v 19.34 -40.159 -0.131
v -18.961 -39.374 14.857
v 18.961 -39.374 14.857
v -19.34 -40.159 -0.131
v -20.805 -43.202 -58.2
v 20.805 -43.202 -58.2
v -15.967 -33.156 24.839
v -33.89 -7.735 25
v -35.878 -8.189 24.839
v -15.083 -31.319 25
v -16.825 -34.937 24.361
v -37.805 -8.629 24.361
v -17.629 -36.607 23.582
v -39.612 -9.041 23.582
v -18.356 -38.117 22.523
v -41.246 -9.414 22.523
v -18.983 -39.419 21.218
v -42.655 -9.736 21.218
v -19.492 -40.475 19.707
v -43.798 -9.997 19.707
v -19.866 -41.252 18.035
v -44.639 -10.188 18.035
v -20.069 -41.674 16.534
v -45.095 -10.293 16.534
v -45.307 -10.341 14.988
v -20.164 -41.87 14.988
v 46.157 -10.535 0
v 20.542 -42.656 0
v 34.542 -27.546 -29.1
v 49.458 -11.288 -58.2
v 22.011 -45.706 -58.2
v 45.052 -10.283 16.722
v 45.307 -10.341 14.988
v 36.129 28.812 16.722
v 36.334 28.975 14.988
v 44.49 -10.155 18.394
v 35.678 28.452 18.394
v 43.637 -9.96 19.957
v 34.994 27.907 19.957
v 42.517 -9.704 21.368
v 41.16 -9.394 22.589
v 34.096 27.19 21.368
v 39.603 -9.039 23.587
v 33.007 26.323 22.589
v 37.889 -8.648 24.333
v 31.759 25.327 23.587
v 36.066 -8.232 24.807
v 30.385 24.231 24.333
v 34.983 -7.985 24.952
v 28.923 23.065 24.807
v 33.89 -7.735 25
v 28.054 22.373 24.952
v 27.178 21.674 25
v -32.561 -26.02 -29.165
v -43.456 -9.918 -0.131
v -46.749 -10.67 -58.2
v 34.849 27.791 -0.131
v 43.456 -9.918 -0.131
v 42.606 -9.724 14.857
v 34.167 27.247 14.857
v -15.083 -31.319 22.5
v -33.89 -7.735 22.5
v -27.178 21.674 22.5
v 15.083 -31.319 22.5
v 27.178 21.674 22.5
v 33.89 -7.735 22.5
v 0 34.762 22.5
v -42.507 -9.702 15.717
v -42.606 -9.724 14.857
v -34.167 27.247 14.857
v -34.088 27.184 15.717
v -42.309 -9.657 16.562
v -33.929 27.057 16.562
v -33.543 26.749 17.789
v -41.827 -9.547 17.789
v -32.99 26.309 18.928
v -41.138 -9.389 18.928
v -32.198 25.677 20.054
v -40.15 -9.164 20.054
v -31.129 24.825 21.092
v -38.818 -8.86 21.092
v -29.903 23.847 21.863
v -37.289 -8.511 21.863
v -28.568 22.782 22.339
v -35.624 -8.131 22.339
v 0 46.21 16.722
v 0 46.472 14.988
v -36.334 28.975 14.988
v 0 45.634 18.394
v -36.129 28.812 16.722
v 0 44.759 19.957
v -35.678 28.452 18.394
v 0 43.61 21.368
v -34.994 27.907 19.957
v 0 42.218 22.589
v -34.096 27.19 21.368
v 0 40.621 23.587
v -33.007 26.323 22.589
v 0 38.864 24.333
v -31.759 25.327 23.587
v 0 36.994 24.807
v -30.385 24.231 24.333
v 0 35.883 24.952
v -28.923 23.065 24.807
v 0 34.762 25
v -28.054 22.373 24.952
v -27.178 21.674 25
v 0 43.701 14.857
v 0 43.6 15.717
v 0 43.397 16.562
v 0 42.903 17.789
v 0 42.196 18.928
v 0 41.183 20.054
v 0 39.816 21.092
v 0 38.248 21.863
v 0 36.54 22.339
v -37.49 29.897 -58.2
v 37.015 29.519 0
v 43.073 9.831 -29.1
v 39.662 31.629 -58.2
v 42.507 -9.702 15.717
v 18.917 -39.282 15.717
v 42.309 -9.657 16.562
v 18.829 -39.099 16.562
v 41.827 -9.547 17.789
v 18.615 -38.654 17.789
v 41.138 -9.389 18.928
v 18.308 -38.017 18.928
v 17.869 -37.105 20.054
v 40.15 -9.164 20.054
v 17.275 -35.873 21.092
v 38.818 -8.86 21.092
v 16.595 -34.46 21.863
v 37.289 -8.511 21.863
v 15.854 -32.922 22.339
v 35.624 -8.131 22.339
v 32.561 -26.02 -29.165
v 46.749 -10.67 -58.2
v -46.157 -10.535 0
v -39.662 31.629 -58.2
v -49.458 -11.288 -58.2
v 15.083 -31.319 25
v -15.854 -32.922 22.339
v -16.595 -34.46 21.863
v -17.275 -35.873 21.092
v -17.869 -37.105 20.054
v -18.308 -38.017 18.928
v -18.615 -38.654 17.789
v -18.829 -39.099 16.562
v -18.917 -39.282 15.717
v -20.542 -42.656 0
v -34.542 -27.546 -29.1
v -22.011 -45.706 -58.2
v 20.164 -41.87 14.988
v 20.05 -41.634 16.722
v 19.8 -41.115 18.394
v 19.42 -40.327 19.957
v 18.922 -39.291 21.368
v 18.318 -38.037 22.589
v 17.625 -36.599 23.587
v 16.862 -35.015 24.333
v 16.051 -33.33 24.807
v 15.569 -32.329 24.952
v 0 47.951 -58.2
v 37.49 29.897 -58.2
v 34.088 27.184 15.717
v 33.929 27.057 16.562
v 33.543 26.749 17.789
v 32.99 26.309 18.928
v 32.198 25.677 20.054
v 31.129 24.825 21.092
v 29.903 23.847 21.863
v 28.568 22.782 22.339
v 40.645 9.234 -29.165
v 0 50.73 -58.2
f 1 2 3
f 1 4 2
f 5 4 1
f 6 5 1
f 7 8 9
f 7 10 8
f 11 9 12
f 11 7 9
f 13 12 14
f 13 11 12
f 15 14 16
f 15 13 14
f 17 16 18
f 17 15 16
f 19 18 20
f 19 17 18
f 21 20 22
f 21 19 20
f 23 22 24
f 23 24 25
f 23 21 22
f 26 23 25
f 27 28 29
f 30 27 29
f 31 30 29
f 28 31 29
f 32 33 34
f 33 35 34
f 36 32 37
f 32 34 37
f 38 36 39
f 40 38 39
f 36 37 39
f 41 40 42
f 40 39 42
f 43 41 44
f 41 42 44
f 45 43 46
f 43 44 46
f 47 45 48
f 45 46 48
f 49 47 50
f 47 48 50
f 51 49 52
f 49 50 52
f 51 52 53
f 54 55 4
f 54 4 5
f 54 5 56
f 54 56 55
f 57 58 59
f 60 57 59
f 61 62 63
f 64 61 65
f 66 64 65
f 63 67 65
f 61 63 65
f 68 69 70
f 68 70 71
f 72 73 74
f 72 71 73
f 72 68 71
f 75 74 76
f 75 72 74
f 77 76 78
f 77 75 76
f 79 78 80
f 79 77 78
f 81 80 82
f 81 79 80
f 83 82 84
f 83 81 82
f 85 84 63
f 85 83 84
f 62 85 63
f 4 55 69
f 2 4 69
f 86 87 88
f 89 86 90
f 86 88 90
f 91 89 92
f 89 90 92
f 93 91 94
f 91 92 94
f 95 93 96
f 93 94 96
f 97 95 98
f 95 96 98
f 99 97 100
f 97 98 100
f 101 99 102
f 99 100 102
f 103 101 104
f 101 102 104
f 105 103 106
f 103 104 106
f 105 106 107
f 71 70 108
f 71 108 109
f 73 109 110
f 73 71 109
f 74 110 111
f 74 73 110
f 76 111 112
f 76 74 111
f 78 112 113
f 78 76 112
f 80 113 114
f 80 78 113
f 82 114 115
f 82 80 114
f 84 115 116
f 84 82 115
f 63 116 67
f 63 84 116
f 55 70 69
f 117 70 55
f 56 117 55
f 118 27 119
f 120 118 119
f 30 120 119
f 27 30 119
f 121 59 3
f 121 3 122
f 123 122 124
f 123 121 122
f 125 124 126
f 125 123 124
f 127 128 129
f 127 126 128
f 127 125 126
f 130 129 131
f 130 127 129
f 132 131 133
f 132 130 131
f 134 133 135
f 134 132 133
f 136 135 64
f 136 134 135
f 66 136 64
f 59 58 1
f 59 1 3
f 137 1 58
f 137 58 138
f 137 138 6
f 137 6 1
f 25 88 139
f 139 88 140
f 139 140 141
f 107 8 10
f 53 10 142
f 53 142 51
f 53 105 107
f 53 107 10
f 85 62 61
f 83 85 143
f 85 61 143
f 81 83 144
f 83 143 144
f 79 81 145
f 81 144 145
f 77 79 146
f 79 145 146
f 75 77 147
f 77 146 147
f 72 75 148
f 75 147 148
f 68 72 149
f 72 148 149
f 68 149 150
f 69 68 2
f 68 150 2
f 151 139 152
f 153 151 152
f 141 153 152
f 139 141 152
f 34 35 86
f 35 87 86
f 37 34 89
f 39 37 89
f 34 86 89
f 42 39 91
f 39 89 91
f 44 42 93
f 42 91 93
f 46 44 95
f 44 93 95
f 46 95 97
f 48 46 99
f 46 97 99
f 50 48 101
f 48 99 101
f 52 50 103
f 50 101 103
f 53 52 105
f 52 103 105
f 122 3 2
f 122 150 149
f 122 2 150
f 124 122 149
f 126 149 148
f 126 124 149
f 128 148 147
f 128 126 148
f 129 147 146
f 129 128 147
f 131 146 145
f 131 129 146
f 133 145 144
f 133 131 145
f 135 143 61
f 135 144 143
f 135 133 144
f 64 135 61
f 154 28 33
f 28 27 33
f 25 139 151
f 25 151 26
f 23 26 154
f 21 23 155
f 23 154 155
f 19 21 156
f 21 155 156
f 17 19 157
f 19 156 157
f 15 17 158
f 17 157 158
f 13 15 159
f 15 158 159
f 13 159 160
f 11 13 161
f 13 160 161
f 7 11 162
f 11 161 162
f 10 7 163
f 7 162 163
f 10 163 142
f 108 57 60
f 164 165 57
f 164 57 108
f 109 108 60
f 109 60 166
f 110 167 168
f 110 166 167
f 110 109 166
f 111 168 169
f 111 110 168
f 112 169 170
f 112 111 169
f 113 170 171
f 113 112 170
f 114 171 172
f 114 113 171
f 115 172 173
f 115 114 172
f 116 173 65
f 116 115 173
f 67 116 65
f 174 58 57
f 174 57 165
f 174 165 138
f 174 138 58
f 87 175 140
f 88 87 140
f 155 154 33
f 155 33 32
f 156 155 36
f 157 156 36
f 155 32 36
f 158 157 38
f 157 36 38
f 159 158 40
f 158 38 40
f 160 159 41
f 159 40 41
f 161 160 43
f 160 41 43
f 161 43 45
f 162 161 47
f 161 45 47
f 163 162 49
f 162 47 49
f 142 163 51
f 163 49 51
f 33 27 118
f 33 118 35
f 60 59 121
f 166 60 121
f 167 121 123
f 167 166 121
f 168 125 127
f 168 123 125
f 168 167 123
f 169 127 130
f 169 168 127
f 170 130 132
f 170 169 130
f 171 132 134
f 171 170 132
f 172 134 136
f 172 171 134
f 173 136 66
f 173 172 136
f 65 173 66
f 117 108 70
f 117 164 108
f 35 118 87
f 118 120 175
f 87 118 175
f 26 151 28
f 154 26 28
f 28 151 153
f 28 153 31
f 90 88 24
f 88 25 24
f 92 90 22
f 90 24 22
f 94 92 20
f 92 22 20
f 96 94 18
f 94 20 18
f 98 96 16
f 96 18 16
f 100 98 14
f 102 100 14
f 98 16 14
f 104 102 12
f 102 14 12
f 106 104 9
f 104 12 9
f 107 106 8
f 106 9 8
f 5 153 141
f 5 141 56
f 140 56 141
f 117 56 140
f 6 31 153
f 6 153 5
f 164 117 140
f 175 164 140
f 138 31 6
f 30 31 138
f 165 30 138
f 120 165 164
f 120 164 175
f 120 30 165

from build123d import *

# Parameters (mm, degrees)
F1_DEPTH      = 25
F1_TAPER      = 3
F1_DEPTH_BACK = 58.2
F1_TAPER_BACK = -3
F2_R          = 10.5652829809
F3_T          = -2.5


with BuildPart() as f1:
    # F0 (on Top) → F1 (new body, two sides)
    with BuildSketch(Plane.XY) as f1_sk:
        Polygon((-20.5419126951, -42.6557212379), (20.5419126951, -42.6557212379), (46.1572588473, -10.5350931276), (37.0152476509, 29.5186749845), (0, 47.3442787621), (-37.0152476509, 29.5186749845), (-46.1572588473, -10.5350931276), align=None)
    extrude(amount=F1_DEPTH, taper=F1_TAPER)
    extrude(f1_sk.sketch, amount=-F1_DEPTH_BACK, taper=F1_TAPER_BACK)

    # F2
    f2_edges = [f1.edges().sort_by_distance(p)[0] for p in [
        (-32.325234, -25.778514, 25),
        (0, -41.345527, 25),
        (32.325234, -25.778514, 25),
        (40.308908, 9.200245, 25),
        (17.939152, 37.251032, 25),
        (-17.939152, 37.251032, 25),
        (-40.308908, 9.200245, 25),
    ]]
    fillet(f2_edges, radius=F2_R)

    # F3
    f3_openings = [f1.faces().sort_by_distance(p)[0] for p in [
        (0, 0, -58.2),
    ]]
    offset(amount=F3_T, openings=f3_openings)


solid = f1.part
